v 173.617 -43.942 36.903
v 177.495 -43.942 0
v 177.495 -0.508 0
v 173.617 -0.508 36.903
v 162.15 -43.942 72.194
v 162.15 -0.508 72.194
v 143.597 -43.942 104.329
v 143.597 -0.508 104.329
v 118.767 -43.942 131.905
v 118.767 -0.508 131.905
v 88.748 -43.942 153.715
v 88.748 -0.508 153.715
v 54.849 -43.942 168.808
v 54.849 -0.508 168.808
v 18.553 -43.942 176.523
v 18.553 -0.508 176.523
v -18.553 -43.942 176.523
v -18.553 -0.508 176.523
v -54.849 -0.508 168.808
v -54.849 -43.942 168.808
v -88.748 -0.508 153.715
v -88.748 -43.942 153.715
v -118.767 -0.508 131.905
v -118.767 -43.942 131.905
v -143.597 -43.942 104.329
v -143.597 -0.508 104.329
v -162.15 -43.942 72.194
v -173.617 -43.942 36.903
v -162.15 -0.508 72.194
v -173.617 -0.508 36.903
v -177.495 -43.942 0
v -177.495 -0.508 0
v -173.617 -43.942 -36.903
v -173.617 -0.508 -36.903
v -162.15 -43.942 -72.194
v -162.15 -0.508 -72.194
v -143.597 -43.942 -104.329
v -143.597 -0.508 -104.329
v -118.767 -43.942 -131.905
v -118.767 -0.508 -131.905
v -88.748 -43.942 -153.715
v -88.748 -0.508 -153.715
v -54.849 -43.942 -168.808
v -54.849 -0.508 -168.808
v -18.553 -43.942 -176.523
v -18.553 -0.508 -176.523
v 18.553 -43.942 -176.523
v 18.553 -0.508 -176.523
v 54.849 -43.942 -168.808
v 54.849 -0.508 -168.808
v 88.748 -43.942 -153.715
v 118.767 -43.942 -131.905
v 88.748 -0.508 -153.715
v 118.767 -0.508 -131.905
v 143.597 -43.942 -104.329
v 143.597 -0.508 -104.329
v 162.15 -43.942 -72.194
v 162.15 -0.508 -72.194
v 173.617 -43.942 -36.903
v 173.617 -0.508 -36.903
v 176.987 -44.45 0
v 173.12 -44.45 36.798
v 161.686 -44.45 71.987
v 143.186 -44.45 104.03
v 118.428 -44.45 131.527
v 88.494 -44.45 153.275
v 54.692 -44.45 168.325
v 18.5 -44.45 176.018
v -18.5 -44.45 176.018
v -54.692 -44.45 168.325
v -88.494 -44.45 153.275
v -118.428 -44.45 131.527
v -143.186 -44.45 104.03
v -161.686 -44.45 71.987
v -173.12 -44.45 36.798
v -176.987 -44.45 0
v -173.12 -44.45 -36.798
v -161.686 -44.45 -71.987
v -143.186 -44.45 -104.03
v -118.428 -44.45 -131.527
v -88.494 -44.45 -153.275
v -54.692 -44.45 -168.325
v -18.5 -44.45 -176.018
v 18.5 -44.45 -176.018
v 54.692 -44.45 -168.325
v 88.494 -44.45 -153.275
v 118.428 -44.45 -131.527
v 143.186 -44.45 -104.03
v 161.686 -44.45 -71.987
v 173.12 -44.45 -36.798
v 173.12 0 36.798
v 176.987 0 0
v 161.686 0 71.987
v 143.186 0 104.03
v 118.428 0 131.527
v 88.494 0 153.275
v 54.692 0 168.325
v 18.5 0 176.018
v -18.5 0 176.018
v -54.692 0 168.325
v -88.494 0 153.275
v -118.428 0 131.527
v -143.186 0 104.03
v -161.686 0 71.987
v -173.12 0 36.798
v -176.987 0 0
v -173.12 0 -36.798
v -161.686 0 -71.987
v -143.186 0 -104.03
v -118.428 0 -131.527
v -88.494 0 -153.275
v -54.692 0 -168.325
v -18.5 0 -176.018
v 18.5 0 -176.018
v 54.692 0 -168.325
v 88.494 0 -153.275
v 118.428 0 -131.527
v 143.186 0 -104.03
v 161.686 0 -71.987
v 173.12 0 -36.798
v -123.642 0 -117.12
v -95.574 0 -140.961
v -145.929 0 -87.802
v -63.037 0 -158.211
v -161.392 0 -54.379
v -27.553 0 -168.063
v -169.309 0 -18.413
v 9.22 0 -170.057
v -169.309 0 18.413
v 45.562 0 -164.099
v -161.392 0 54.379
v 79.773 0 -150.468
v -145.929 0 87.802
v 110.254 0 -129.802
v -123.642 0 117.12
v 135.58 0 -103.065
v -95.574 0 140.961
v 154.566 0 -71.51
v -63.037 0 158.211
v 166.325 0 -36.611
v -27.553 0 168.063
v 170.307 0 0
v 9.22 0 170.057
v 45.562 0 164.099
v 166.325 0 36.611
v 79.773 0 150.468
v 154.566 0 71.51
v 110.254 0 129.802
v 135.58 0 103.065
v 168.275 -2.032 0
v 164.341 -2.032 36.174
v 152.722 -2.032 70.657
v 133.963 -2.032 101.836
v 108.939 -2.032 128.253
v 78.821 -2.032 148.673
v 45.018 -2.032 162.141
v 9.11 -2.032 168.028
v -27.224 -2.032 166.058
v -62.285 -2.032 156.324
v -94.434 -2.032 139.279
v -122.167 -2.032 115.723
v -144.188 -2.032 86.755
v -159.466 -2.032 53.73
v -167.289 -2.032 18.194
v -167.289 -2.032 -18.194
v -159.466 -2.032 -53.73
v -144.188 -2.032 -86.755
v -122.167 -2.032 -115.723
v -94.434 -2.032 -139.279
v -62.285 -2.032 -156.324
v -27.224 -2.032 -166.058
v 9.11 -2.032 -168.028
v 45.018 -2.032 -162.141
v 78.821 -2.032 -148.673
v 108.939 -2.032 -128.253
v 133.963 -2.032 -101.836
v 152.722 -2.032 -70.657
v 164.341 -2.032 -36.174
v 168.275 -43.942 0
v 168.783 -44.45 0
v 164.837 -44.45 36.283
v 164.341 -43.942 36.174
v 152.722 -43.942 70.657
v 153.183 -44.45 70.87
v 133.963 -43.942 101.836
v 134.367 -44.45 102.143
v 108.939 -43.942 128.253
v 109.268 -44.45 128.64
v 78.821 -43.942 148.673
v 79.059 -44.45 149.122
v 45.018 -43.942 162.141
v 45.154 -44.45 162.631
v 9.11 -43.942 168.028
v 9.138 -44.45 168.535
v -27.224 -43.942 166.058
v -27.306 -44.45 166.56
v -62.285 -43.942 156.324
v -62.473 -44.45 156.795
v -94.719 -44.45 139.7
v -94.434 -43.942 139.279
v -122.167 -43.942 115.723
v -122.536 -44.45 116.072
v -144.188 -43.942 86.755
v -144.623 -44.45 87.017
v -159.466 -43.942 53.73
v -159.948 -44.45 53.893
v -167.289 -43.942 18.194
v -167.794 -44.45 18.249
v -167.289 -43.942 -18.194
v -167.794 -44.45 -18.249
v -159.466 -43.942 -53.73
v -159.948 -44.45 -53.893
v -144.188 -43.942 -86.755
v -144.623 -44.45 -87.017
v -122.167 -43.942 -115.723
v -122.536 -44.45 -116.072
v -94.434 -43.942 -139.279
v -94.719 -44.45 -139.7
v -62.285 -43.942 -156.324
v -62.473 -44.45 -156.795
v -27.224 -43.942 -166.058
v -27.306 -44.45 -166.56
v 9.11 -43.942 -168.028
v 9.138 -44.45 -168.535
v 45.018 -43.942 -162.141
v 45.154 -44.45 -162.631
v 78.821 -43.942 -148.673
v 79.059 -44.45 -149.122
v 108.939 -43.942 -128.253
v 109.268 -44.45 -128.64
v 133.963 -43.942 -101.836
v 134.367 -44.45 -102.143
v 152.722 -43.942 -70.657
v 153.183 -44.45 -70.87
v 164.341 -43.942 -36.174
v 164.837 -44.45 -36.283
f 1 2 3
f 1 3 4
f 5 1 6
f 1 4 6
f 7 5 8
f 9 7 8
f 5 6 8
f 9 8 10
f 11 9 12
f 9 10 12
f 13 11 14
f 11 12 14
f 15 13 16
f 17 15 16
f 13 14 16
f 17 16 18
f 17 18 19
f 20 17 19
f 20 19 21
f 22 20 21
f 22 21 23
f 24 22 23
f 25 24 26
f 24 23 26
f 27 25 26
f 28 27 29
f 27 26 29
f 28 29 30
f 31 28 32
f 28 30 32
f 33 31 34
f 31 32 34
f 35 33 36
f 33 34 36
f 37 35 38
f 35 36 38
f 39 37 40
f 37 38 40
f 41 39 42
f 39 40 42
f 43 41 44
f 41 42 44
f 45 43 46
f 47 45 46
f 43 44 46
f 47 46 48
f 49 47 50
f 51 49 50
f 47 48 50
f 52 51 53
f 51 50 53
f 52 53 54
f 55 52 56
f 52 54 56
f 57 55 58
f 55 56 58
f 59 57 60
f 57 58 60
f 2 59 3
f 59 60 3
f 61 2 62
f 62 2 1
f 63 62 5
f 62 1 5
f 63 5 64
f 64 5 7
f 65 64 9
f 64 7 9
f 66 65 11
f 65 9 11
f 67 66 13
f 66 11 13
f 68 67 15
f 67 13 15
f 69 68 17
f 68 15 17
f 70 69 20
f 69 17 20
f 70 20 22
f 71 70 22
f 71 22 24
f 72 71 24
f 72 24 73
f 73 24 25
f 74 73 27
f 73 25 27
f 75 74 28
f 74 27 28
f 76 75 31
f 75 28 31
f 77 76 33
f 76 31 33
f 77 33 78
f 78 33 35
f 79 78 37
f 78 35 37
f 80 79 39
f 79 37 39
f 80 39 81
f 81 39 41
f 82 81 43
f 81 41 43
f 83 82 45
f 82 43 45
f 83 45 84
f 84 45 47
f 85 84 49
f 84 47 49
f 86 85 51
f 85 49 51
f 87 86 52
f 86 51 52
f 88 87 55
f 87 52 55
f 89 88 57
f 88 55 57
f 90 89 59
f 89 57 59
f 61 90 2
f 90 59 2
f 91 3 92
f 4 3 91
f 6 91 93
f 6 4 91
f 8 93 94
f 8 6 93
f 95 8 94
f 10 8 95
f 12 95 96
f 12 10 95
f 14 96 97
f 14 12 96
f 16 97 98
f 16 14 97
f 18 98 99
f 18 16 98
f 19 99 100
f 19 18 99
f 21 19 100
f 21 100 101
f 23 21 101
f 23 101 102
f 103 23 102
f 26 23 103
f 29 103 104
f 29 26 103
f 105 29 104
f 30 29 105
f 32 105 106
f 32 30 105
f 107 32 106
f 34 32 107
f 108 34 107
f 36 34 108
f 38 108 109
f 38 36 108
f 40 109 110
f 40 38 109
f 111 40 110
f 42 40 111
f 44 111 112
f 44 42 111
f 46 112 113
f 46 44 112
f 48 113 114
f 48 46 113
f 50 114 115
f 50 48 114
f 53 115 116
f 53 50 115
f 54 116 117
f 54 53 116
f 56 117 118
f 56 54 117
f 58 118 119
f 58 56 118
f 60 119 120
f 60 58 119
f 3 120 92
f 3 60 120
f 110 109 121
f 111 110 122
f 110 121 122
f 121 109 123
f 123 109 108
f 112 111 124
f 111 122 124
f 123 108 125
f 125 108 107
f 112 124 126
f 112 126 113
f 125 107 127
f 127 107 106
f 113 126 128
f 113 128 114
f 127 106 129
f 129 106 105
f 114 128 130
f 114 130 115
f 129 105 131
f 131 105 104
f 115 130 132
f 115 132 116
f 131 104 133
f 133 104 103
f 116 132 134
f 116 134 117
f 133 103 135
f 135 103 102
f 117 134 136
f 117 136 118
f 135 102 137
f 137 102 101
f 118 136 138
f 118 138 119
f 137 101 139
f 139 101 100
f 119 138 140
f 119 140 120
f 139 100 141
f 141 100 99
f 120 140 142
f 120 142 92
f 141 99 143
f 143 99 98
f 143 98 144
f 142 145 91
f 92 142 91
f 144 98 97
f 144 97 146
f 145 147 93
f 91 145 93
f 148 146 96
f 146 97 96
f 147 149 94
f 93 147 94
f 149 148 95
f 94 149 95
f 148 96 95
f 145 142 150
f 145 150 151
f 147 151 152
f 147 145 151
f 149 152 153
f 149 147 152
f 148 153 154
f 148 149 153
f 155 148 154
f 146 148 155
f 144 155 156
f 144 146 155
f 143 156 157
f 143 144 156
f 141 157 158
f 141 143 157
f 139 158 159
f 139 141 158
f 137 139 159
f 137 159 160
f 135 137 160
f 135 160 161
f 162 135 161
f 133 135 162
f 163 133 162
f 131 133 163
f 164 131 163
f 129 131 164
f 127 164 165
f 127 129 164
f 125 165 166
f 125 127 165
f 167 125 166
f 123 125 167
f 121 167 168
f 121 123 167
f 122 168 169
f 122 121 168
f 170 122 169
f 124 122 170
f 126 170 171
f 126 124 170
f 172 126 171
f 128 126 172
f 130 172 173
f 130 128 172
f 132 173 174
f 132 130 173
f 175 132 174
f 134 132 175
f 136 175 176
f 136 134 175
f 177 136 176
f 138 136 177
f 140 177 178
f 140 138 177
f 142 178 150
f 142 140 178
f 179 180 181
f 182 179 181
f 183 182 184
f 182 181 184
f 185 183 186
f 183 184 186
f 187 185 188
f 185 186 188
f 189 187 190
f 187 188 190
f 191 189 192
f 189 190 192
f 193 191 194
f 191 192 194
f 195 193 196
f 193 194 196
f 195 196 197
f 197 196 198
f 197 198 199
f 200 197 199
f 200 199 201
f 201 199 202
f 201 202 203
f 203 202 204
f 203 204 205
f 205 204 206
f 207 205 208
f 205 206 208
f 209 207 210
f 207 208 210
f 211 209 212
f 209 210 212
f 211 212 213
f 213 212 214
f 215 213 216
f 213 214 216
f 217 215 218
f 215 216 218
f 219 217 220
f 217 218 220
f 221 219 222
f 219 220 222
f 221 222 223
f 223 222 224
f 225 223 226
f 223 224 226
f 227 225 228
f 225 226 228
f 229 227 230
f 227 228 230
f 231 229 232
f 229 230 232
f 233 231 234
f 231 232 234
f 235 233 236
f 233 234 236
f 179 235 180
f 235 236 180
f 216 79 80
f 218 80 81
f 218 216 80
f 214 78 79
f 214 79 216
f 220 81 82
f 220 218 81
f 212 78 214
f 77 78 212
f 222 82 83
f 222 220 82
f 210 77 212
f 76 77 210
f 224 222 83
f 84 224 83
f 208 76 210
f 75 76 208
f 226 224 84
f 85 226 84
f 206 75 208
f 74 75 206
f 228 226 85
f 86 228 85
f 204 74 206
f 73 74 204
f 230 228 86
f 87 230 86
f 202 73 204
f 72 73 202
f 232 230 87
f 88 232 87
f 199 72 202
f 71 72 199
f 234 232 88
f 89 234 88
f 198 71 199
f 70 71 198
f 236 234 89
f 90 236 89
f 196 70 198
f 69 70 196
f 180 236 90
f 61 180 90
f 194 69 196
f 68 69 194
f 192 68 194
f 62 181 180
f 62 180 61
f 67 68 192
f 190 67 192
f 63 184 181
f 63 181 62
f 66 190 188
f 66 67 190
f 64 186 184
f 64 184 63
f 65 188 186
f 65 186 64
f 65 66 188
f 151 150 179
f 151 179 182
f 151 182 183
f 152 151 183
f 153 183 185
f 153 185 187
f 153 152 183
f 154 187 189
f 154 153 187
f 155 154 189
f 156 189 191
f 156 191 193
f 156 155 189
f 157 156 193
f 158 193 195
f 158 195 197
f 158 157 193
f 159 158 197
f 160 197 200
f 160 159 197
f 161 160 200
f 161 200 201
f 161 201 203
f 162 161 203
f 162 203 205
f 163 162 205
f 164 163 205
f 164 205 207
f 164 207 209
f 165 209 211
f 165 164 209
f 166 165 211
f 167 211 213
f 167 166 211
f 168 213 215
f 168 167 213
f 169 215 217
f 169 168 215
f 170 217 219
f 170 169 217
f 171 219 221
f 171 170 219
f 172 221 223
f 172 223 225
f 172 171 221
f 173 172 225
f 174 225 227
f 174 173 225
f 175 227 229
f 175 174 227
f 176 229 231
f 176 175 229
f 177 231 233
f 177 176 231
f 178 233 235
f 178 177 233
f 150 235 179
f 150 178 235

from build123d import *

# Parameters (mm, degrees)
F0_R     = 177.4952
F0_R_2   = 168.275
F1_DEPTH = 44.45
F2_SIZE  = 2.032
F3_SIZE  = 0.508


with BuildPart() as f1:
    # F0 (on Front) → F1 (new body)
    with BuildSketch(Plane.XZ):
        Circle(F0_R)
        Circle(F0_R_2, mode=Mode.SUBTRACT)
    extrude(amount=F1_DEPTH)

    # F2
    f2_edges = [f1.edges().sort_by_distance(p)[0] for p in [
        (-168.275, 0, 0),
    ]]
    chamfer(f2_edges, length=F2_SIZE)

    # F3
    f3_edges = [f1.edges().sort_by_distance(p)[0] for p in [
        (-168.275, -44.45, 0),
        (-177.4952, -44.45, 0),
        (-177.4952, 0, 0),
    ]]
    chamfer(f3_edges, length=F3_SIZE)


solid = f1.part
